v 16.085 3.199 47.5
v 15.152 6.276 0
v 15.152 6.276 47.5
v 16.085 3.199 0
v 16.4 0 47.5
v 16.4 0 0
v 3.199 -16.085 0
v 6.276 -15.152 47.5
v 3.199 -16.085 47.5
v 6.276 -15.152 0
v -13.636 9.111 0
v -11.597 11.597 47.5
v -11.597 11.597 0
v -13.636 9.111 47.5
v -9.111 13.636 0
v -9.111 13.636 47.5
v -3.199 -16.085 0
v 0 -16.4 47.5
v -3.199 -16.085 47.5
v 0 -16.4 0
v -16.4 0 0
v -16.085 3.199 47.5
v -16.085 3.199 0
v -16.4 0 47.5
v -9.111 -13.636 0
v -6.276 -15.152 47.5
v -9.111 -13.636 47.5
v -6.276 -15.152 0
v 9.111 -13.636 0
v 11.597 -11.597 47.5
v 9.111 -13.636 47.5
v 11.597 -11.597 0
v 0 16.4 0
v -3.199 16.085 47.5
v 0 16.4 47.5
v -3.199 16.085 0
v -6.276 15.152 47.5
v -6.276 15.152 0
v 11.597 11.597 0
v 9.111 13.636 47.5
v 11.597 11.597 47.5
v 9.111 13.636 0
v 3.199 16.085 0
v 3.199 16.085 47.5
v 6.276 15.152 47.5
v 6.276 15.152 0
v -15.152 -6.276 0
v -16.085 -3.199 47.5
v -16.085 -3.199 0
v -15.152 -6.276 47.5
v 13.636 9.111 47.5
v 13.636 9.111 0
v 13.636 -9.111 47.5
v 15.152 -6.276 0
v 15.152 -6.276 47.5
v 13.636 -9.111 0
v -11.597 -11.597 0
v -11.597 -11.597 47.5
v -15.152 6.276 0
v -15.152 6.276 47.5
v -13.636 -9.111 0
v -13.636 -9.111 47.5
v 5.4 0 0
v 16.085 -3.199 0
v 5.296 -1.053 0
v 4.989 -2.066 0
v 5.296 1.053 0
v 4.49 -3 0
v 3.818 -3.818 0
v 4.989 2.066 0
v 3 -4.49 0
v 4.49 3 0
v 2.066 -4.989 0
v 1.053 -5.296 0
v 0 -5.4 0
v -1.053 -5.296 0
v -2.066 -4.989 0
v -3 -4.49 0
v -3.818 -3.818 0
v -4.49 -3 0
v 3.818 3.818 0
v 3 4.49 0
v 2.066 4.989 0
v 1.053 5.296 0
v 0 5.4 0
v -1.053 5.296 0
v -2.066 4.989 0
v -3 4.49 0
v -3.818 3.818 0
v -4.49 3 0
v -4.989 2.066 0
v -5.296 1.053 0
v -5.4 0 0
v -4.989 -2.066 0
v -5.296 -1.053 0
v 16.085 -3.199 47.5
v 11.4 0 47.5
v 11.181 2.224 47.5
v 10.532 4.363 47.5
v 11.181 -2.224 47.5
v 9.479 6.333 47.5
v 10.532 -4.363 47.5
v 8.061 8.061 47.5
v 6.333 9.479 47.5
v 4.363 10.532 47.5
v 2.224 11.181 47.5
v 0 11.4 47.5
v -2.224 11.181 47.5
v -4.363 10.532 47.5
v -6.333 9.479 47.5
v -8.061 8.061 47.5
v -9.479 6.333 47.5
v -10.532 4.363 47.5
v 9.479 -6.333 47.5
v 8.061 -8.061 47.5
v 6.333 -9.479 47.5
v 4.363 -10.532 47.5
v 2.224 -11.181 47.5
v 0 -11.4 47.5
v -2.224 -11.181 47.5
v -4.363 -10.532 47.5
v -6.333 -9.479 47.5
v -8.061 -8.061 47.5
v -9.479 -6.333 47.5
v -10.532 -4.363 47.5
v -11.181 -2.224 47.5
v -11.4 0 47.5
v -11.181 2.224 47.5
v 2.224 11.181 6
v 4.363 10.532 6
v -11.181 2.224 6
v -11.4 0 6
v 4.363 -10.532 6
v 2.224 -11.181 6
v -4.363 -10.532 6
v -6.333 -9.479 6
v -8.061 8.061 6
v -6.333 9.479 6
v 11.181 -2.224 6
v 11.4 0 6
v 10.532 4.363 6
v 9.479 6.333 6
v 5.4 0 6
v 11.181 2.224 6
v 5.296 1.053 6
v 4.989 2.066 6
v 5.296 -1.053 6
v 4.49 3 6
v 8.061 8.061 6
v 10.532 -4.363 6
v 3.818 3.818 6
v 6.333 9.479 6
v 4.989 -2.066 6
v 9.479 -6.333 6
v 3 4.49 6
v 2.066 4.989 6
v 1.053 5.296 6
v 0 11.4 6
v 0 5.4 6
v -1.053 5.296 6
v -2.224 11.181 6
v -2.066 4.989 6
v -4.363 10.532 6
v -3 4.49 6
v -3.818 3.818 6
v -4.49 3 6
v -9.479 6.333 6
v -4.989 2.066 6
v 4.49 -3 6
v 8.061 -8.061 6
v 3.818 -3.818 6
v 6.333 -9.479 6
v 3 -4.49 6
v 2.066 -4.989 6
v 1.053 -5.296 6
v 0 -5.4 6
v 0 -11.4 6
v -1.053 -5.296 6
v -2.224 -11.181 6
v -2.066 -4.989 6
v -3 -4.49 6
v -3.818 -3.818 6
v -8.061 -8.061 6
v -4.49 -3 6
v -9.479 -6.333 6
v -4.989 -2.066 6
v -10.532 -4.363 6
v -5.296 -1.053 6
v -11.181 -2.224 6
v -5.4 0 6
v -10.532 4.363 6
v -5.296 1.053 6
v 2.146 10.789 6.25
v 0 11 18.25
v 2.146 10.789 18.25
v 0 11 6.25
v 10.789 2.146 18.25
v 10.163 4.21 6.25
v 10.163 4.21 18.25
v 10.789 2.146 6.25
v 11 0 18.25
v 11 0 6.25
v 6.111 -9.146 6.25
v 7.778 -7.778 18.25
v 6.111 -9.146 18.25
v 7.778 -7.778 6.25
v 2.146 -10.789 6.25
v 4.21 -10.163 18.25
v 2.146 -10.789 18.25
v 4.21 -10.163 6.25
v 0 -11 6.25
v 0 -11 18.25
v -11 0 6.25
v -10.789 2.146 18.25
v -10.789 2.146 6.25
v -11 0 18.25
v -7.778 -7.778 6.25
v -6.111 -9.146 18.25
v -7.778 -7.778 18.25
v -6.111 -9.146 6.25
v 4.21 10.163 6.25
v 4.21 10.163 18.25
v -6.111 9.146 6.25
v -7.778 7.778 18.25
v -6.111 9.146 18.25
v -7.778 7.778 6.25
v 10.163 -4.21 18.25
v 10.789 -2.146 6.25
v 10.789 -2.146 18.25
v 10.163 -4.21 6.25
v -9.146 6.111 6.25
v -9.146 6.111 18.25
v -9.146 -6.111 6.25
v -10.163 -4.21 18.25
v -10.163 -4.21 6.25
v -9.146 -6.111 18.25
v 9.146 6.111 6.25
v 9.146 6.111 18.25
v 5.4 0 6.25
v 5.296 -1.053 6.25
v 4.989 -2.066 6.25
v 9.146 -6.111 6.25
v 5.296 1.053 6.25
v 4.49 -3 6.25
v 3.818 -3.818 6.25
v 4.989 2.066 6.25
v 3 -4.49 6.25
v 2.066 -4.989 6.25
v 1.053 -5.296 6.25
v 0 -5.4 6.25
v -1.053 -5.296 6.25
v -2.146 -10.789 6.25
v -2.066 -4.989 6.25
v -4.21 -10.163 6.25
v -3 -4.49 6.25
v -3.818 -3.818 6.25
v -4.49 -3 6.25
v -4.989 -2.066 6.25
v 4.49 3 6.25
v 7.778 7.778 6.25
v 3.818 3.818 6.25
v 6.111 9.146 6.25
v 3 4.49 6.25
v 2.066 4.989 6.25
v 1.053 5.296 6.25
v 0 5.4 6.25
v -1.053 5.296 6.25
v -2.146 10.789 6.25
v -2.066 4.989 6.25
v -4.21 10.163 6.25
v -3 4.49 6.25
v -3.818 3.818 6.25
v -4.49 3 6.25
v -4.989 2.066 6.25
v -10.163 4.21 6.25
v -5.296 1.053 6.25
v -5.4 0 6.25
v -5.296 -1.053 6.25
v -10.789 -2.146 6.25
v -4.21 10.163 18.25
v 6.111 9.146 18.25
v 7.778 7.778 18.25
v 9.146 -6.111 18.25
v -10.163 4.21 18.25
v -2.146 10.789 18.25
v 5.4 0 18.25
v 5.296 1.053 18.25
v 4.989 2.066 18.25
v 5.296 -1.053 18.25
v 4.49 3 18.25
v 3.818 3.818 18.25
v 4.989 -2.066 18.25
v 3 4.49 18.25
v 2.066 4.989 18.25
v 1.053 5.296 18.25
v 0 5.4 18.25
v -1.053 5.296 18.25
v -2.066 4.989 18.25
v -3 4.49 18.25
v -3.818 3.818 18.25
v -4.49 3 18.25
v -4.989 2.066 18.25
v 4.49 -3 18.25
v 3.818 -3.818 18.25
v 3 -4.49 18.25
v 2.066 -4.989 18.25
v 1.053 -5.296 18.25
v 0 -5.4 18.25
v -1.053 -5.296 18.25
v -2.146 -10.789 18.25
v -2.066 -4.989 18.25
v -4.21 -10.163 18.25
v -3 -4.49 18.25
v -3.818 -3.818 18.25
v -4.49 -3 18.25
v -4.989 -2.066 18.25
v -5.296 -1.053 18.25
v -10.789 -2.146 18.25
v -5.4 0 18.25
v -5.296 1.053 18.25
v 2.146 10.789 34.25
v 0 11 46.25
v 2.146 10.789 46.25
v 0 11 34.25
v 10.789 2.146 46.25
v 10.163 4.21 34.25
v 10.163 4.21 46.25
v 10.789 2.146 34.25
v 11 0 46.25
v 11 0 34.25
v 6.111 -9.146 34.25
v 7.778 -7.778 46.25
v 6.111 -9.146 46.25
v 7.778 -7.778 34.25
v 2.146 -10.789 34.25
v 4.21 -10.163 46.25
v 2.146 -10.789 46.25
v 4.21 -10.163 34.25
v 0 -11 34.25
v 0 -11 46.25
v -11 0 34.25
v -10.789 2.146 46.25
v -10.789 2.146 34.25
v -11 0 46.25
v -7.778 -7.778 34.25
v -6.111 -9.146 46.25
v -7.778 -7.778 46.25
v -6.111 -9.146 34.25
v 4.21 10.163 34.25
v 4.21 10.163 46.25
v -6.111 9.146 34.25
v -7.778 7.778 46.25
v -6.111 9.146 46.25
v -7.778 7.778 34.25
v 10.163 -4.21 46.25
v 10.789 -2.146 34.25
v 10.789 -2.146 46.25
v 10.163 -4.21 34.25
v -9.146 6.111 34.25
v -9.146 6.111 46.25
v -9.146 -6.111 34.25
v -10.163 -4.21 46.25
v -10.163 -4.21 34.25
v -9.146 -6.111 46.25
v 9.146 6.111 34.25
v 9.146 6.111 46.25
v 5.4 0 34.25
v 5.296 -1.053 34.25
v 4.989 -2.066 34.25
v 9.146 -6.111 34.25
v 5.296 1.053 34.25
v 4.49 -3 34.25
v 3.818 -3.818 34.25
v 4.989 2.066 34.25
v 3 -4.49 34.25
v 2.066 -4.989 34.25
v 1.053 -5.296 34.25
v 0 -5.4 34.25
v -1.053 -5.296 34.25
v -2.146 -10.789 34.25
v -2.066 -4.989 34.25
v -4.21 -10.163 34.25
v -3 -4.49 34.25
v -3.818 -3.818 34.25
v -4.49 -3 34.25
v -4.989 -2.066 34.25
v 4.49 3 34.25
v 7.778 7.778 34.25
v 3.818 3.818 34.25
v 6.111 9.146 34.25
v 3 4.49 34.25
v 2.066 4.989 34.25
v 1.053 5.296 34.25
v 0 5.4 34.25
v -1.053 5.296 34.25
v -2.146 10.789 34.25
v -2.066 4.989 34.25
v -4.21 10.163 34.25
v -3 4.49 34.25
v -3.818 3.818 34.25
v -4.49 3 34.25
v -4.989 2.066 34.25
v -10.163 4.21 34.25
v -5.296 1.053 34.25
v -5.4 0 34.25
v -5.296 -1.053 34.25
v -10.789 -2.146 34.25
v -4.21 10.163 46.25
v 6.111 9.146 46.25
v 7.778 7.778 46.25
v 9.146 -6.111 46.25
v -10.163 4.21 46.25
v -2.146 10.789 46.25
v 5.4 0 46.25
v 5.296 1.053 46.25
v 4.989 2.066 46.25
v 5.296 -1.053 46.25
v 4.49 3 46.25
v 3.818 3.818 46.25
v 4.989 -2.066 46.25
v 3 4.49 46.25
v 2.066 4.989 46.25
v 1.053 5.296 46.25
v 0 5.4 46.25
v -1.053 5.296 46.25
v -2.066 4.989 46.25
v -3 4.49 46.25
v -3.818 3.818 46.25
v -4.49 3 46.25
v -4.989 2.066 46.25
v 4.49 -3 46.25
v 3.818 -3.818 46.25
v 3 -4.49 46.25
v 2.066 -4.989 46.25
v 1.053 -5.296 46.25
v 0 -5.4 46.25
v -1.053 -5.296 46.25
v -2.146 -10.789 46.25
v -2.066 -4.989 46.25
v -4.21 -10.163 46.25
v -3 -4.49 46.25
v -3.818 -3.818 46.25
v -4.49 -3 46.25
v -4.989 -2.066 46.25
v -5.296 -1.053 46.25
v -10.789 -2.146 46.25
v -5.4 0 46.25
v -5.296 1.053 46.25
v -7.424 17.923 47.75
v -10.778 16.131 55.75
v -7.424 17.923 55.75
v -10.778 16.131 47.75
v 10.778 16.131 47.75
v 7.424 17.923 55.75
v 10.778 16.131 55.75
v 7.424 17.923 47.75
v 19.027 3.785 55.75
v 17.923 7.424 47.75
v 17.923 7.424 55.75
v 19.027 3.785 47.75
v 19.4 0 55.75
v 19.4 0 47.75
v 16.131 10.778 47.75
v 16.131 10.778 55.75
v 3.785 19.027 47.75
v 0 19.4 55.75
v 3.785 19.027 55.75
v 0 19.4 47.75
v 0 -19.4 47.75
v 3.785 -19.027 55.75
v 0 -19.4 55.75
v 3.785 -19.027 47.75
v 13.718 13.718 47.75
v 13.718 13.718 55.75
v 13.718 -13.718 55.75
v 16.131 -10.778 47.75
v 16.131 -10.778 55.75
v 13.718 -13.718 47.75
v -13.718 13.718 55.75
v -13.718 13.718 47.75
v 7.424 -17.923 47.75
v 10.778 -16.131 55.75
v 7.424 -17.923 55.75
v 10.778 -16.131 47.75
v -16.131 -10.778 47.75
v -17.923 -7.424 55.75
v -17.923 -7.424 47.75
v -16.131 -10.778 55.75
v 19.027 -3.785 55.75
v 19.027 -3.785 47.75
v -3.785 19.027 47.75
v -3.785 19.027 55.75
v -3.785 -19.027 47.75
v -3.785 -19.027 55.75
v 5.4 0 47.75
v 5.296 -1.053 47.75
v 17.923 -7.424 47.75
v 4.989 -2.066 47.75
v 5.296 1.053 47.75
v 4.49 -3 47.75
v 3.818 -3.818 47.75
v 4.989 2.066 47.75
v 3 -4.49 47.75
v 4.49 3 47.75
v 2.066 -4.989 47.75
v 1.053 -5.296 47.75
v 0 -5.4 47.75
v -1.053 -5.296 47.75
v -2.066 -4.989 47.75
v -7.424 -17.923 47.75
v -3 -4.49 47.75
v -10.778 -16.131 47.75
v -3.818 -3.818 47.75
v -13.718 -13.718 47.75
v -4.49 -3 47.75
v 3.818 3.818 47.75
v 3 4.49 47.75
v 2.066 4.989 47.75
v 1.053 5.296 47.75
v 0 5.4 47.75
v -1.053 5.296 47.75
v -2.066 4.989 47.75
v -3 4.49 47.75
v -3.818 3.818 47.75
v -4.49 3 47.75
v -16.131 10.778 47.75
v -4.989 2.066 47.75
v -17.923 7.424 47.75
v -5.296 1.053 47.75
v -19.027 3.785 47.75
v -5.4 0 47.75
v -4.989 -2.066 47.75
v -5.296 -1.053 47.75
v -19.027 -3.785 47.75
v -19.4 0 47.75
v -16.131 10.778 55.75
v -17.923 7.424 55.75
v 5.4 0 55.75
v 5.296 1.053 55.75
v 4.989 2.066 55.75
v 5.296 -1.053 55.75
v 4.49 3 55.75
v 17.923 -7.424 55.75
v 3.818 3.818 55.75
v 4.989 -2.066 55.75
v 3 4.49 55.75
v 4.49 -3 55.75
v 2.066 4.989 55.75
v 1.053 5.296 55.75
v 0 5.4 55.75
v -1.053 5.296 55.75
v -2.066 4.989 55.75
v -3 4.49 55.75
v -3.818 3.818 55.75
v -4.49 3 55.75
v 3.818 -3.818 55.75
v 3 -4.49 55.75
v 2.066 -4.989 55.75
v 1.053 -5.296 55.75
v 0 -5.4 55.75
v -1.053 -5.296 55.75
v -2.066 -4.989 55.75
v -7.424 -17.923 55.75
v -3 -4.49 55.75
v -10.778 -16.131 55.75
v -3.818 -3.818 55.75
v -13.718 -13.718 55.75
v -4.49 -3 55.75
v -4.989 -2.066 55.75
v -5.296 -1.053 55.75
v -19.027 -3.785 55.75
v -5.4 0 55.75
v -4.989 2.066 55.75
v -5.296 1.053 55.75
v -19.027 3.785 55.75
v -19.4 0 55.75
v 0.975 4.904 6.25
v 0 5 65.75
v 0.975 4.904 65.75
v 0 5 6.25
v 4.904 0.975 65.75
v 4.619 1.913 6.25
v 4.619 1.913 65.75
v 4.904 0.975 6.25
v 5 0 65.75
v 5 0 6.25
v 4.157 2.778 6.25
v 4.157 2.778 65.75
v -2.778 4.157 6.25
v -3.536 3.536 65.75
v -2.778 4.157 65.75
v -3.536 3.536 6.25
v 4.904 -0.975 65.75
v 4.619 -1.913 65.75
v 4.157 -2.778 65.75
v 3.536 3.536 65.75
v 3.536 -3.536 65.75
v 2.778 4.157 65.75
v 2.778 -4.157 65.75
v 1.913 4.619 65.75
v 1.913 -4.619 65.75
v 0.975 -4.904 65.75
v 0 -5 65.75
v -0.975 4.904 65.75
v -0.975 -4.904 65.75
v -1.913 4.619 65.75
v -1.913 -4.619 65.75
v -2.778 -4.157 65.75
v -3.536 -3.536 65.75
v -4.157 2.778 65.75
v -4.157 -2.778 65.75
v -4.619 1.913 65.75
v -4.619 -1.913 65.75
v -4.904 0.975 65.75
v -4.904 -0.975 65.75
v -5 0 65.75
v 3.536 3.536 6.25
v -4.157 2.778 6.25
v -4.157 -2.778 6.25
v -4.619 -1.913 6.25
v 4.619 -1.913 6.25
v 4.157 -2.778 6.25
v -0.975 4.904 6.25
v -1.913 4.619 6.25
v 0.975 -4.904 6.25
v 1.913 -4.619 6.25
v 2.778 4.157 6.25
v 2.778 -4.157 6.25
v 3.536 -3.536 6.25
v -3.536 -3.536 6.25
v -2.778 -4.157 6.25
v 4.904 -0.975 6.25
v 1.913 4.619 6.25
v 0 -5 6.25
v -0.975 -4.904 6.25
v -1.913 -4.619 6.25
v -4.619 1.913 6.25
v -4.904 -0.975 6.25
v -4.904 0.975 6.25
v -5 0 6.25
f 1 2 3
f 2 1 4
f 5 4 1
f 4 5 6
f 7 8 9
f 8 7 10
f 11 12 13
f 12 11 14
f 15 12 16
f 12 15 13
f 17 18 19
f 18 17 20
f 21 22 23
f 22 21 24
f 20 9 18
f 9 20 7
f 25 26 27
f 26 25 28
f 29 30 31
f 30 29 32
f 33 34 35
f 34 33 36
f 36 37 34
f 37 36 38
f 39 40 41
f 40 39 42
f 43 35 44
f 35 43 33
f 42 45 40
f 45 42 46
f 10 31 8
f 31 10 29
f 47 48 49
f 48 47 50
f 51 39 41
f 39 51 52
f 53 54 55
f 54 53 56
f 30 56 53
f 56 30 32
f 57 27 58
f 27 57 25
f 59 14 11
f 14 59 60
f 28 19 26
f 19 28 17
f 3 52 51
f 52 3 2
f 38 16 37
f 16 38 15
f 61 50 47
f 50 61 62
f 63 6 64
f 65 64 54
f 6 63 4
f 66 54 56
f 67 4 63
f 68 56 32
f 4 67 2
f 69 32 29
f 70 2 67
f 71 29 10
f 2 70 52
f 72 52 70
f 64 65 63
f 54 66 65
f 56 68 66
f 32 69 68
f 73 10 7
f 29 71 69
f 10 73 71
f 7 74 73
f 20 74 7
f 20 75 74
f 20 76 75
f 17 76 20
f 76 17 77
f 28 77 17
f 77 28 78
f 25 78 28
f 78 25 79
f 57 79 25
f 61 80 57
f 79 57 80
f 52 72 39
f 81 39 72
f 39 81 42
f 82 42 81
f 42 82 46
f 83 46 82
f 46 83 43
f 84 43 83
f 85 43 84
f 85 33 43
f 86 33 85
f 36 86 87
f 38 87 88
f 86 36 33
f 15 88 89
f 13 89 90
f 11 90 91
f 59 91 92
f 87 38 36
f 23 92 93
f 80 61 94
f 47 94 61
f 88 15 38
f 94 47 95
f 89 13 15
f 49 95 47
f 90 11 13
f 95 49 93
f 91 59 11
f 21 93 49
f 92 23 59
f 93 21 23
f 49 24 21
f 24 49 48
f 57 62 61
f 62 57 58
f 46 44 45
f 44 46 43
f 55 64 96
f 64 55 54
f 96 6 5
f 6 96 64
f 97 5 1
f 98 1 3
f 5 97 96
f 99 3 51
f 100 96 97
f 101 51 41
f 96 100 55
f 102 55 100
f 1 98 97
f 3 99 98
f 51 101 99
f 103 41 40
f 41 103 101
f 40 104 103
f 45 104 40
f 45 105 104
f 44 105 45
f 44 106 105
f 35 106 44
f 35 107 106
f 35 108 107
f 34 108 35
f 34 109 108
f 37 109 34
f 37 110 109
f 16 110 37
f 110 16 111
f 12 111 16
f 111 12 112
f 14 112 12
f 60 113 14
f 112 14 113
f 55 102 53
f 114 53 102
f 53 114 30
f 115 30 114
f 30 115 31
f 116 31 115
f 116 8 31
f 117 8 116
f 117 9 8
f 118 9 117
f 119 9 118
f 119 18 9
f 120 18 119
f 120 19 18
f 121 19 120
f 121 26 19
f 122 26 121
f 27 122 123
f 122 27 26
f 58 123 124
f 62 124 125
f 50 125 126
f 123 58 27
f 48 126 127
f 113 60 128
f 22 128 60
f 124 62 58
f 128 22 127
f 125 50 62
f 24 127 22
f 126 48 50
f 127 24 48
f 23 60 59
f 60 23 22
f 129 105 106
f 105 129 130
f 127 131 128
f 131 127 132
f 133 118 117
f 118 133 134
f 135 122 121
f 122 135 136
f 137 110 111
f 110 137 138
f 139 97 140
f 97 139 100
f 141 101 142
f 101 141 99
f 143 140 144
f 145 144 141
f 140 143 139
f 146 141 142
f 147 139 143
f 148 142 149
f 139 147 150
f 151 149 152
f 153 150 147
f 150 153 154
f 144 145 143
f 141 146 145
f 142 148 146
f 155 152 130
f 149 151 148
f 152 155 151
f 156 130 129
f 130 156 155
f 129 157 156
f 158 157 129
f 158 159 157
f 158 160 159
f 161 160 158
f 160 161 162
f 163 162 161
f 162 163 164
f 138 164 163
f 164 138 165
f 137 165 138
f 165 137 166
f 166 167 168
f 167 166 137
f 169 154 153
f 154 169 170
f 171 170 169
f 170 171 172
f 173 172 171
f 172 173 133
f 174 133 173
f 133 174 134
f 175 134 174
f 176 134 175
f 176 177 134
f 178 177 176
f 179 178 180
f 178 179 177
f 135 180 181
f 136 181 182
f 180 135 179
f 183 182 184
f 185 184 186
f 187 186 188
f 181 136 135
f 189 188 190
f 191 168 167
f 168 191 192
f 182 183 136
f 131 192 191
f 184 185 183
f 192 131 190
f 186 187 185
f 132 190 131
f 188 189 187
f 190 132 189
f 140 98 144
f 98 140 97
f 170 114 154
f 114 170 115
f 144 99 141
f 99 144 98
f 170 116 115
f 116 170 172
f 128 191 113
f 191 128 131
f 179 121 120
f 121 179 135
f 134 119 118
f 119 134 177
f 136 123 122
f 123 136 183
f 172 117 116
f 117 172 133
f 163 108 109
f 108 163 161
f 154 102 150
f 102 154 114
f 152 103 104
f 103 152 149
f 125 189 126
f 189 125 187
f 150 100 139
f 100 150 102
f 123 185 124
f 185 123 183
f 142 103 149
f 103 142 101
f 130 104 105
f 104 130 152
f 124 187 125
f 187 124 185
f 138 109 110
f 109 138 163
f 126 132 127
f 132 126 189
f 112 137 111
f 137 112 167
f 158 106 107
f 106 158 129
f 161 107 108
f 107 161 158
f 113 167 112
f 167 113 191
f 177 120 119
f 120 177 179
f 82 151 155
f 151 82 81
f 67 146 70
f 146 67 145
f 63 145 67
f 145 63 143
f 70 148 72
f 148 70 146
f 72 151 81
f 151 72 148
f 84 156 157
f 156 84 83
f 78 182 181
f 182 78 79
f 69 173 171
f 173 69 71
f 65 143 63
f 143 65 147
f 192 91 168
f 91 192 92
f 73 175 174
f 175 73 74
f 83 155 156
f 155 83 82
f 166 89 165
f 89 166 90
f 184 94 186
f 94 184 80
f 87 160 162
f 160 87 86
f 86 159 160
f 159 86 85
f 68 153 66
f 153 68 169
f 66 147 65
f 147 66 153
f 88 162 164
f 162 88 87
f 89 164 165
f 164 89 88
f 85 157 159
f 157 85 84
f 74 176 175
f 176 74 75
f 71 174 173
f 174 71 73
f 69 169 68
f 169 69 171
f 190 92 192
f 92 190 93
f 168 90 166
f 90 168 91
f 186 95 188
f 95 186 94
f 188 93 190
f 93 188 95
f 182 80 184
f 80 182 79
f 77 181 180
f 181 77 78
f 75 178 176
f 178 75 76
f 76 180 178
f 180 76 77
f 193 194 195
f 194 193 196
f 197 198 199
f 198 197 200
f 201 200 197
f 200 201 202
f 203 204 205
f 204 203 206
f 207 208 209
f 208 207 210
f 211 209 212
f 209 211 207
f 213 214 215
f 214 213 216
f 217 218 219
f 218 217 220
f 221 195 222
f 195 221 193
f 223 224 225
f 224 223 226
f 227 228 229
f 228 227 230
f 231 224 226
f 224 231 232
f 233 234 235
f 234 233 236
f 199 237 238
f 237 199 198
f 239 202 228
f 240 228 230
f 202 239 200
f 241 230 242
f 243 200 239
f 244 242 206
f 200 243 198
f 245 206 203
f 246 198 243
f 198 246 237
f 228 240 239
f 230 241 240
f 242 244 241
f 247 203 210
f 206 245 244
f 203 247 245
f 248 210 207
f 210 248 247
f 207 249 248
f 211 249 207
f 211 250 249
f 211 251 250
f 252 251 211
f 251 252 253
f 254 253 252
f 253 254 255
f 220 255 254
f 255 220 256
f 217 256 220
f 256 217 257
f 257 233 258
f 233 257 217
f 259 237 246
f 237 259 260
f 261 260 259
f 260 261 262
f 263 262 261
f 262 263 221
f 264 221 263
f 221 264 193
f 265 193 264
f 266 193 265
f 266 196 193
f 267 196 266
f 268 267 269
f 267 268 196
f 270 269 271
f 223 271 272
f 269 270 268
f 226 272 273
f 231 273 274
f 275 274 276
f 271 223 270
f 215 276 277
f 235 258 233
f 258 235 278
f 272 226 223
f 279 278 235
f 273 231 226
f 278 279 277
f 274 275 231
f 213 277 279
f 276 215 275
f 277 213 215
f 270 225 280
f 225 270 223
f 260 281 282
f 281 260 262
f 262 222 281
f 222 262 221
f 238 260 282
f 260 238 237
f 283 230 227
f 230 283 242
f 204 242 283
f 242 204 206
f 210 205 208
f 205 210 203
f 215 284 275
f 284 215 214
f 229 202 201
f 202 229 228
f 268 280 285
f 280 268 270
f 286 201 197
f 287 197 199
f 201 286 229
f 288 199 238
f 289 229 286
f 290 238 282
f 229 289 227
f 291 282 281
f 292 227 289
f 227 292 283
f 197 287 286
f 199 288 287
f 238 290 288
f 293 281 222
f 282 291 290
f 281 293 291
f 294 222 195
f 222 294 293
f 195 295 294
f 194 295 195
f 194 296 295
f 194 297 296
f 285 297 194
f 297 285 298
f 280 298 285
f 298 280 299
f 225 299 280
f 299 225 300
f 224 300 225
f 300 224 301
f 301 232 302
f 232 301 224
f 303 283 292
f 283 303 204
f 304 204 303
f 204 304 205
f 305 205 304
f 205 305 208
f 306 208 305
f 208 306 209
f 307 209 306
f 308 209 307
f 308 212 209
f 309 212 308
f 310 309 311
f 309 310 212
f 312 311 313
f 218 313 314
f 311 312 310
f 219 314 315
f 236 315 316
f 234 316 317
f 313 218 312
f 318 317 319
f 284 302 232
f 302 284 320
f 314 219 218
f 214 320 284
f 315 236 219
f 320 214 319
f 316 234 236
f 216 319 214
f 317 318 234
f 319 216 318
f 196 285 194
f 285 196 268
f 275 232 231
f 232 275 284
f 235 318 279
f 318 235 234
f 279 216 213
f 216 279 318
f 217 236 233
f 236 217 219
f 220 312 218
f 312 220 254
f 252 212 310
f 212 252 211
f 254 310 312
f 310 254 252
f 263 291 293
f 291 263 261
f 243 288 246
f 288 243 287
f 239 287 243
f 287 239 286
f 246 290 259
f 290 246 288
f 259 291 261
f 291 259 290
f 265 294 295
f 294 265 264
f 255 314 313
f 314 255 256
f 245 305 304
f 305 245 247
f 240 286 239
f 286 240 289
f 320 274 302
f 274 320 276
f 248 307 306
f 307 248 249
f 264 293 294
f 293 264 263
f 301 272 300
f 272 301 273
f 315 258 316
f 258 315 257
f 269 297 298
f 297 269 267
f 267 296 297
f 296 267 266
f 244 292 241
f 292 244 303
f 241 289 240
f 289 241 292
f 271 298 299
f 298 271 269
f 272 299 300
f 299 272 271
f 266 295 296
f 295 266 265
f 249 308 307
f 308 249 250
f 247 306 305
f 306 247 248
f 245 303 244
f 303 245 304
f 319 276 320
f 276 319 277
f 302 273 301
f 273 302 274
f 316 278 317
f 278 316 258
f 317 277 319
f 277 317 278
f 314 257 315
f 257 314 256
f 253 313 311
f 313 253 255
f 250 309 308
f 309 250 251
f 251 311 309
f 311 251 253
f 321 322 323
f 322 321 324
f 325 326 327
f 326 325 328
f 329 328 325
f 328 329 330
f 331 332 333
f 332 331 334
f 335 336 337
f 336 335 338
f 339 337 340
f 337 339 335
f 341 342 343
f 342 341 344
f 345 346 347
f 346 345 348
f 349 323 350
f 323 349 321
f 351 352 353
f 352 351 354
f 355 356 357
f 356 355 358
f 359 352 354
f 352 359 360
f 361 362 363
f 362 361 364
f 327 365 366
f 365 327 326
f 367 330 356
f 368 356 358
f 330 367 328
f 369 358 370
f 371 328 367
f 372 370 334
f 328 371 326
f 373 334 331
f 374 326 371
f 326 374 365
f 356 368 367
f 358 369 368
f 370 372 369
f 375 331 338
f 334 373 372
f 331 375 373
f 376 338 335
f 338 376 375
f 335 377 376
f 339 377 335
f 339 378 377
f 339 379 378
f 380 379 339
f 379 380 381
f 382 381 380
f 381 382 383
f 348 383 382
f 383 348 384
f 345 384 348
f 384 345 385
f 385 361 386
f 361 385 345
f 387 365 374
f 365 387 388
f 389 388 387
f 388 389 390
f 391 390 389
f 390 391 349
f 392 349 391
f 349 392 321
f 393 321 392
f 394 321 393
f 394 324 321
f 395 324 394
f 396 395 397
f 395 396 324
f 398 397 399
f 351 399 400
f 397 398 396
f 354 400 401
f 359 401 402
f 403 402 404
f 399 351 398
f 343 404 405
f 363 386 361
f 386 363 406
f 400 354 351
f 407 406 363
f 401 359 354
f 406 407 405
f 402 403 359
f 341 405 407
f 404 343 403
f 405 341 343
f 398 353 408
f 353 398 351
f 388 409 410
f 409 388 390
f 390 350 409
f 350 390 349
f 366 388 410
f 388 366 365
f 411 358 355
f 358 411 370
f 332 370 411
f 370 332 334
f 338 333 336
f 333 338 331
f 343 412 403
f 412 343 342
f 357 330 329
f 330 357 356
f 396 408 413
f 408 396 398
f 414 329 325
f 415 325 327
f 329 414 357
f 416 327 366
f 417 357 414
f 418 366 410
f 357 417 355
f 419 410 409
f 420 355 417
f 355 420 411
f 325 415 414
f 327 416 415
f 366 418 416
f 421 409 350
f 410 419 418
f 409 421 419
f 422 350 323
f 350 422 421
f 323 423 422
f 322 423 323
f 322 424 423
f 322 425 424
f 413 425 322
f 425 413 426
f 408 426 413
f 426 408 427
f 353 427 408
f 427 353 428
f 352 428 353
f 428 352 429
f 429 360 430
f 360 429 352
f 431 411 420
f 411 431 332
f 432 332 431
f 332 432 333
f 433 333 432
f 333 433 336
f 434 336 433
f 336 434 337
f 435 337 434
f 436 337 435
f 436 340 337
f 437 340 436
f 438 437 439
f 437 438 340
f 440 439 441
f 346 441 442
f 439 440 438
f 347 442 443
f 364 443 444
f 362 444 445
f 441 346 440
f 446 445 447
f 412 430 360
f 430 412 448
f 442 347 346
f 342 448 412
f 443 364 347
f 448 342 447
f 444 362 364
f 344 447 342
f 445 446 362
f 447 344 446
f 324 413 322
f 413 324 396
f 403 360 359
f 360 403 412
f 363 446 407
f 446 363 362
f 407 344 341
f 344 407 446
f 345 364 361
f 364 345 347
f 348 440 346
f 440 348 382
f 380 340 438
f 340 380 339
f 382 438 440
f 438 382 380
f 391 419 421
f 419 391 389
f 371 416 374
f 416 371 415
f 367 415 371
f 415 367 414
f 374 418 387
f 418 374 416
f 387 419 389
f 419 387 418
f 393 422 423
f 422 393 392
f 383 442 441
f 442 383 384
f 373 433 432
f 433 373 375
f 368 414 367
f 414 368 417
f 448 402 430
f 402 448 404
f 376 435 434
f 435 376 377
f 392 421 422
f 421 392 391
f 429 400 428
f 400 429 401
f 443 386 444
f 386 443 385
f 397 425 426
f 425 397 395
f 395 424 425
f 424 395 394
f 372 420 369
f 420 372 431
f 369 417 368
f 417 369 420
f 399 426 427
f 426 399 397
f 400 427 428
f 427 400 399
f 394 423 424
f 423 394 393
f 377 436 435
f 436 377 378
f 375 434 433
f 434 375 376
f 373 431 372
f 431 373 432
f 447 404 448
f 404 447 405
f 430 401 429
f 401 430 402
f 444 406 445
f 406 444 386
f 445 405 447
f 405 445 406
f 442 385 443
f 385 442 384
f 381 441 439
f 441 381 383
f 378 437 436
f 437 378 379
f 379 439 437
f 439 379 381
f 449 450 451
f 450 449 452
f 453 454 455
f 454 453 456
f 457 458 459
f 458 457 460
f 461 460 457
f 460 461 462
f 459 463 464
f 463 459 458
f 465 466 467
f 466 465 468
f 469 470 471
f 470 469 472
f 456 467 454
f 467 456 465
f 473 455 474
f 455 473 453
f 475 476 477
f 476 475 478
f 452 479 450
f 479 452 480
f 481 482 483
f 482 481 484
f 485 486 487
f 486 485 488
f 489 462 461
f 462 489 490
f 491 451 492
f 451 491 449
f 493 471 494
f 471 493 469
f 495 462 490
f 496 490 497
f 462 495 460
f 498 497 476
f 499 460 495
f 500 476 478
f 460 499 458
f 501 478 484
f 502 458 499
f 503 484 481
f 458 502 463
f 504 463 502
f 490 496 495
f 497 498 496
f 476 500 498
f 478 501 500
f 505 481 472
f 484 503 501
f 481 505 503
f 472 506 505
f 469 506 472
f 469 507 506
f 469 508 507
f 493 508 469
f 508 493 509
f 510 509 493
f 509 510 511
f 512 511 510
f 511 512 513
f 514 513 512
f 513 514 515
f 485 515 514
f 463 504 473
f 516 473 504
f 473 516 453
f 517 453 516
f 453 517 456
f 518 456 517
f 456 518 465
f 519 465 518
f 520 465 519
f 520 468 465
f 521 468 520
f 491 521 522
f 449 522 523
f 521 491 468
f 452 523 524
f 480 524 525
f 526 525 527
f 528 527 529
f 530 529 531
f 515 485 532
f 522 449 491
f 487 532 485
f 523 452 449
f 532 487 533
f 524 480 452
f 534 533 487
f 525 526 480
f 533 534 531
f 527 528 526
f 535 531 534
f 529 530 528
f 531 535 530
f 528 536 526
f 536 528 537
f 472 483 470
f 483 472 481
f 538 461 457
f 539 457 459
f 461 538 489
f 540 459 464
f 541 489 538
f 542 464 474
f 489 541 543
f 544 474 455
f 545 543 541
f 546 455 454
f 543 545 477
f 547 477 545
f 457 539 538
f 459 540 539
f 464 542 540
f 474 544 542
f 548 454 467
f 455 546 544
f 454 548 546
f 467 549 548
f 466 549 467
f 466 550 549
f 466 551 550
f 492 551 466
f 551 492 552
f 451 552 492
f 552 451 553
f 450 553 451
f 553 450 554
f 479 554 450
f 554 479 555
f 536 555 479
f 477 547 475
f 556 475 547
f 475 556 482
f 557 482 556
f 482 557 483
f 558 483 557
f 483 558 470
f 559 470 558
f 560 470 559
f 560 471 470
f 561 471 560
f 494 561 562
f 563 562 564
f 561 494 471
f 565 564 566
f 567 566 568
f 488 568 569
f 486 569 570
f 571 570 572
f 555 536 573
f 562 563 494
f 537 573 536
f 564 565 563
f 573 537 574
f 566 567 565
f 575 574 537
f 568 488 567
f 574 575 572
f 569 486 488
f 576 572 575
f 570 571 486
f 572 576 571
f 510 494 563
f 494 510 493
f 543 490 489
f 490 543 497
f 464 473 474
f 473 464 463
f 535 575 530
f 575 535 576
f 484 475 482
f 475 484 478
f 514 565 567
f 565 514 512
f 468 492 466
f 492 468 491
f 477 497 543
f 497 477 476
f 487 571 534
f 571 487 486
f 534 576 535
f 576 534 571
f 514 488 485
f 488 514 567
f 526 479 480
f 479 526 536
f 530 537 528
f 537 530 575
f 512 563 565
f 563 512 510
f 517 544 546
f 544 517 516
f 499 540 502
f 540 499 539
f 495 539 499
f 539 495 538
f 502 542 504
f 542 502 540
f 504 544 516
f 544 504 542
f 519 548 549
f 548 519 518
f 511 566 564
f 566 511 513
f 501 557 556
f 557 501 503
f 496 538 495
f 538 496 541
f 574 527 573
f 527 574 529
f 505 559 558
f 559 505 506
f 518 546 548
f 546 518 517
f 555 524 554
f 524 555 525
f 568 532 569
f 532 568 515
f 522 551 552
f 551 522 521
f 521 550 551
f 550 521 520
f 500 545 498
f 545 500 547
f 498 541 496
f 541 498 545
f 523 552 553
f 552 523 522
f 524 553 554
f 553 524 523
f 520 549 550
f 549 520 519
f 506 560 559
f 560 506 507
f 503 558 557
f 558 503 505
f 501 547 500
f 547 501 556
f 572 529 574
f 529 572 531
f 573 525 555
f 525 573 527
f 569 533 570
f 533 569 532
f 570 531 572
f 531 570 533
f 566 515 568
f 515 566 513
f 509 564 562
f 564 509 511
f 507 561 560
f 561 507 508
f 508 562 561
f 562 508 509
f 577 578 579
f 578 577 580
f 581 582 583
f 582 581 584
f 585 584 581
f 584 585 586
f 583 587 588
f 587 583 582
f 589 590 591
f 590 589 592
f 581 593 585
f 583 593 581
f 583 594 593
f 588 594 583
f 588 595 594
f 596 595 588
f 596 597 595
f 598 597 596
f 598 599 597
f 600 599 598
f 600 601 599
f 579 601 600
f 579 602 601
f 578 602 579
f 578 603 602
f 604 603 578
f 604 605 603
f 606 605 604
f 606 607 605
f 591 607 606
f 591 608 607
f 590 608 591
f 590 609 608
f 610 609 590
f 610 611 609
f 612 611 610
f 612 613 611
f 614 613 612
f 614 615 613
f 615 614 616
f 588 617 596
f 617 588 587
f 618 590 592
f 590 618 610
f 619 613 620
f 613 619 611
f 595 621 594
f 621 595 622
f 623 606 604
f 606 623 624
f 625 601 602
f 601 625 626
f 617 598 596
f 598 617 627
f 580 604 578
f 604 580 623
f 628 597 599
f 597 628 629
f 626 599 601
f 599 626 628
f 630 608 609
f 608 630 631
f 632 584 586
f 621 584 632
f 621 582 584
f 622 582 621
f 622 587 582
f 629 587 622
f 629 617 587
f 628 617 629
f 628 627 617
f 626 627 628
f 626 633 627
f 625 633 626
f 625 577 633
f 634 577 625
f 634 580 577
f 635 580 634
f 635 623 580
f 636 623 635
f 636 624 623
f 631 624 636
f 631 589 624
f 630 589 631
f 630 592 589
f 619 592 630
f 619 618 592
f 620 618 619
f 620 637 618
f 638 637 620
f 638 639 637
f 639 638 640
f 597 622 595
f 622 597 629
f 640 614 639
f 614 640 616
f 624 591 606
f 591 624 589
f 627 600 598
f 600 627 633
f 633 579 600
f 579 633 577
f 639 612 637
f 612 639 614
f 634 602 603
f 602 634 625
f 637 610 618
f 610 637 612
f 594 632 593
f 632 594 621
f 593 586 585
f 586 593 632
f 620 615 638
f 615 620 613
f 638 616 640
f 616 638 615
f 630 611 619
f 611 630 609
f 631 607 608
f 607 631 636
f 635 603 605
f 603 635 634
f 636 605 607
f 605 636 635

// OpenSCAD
$fn = 32;

// ------------------------------------------------------------------------
// Shaft station: cup d32.8 x 47.5 mm, shaft d10
// Every part is its own module, assembly() places every instance.
// ------------------------------------------------------------------------

// --- part 1 ---
module housing_cup() {
  difference() {
    cylinder(h = 47.5, d = 32.8);
    translate([0, 0, 6]) cylinder(h = 42.5, d = 22.8);
    translate([0, 0, -1]) cylinder(h = 8, d = 10.8);
  }
}

// --- part 2 ---
module bearing_lower() {
  difference() {
      translate([0, 0, 0]) cylinder(h = 12, d = 22);
      translate([0, 0, -1]) cylinder(h = 14, d = 10.8);
    }
}

// --- part 3 ---
module bearing_upper() {
  difference() {
      translate([0, 0, 0]) cylinder(h = 12, d = 22);
      translate([0, 0, -1]) cylinder(h = 14, d = 10.8);
    }
}

// --- part 4 ---
module station_shaft() {
  translate([0, 0, -29.75]) cylinder(h = 59.5, d = 10);
}

// --- part 5 ---
module station_cover() {
  difference() {
    cylinder(h = 8, d = 38.8);
    translate([0, 0, -1]) cylinder(h = 10, d = 10.8);
  }
}

// --- assembly ---
module assembly() {
  color([0.80, 0.24, 0.20]) translate([0, 0, 0]) rotate([0, 0, 0]) housing_cup();
  color([0.20, 0.45, 0.75]) translate([0, 0, 6.25]) rotate([0, 0, 0]) bearing_lower();
  color([0.25, 0.62, 0.32]) translate([0, 0, 34.25]) rotate([0, 0, 0]) bearing_upper();
  color([0.92, 0.70, 0.18]) translate([0, 0, 36]) rotate([0, 0, 0]) station_shaft();
  color([0.58, 0.35, 0.70]) translate([0, 0, 47.75]) rotate([0, 0, 0]) station_cover();
}

assembly();
